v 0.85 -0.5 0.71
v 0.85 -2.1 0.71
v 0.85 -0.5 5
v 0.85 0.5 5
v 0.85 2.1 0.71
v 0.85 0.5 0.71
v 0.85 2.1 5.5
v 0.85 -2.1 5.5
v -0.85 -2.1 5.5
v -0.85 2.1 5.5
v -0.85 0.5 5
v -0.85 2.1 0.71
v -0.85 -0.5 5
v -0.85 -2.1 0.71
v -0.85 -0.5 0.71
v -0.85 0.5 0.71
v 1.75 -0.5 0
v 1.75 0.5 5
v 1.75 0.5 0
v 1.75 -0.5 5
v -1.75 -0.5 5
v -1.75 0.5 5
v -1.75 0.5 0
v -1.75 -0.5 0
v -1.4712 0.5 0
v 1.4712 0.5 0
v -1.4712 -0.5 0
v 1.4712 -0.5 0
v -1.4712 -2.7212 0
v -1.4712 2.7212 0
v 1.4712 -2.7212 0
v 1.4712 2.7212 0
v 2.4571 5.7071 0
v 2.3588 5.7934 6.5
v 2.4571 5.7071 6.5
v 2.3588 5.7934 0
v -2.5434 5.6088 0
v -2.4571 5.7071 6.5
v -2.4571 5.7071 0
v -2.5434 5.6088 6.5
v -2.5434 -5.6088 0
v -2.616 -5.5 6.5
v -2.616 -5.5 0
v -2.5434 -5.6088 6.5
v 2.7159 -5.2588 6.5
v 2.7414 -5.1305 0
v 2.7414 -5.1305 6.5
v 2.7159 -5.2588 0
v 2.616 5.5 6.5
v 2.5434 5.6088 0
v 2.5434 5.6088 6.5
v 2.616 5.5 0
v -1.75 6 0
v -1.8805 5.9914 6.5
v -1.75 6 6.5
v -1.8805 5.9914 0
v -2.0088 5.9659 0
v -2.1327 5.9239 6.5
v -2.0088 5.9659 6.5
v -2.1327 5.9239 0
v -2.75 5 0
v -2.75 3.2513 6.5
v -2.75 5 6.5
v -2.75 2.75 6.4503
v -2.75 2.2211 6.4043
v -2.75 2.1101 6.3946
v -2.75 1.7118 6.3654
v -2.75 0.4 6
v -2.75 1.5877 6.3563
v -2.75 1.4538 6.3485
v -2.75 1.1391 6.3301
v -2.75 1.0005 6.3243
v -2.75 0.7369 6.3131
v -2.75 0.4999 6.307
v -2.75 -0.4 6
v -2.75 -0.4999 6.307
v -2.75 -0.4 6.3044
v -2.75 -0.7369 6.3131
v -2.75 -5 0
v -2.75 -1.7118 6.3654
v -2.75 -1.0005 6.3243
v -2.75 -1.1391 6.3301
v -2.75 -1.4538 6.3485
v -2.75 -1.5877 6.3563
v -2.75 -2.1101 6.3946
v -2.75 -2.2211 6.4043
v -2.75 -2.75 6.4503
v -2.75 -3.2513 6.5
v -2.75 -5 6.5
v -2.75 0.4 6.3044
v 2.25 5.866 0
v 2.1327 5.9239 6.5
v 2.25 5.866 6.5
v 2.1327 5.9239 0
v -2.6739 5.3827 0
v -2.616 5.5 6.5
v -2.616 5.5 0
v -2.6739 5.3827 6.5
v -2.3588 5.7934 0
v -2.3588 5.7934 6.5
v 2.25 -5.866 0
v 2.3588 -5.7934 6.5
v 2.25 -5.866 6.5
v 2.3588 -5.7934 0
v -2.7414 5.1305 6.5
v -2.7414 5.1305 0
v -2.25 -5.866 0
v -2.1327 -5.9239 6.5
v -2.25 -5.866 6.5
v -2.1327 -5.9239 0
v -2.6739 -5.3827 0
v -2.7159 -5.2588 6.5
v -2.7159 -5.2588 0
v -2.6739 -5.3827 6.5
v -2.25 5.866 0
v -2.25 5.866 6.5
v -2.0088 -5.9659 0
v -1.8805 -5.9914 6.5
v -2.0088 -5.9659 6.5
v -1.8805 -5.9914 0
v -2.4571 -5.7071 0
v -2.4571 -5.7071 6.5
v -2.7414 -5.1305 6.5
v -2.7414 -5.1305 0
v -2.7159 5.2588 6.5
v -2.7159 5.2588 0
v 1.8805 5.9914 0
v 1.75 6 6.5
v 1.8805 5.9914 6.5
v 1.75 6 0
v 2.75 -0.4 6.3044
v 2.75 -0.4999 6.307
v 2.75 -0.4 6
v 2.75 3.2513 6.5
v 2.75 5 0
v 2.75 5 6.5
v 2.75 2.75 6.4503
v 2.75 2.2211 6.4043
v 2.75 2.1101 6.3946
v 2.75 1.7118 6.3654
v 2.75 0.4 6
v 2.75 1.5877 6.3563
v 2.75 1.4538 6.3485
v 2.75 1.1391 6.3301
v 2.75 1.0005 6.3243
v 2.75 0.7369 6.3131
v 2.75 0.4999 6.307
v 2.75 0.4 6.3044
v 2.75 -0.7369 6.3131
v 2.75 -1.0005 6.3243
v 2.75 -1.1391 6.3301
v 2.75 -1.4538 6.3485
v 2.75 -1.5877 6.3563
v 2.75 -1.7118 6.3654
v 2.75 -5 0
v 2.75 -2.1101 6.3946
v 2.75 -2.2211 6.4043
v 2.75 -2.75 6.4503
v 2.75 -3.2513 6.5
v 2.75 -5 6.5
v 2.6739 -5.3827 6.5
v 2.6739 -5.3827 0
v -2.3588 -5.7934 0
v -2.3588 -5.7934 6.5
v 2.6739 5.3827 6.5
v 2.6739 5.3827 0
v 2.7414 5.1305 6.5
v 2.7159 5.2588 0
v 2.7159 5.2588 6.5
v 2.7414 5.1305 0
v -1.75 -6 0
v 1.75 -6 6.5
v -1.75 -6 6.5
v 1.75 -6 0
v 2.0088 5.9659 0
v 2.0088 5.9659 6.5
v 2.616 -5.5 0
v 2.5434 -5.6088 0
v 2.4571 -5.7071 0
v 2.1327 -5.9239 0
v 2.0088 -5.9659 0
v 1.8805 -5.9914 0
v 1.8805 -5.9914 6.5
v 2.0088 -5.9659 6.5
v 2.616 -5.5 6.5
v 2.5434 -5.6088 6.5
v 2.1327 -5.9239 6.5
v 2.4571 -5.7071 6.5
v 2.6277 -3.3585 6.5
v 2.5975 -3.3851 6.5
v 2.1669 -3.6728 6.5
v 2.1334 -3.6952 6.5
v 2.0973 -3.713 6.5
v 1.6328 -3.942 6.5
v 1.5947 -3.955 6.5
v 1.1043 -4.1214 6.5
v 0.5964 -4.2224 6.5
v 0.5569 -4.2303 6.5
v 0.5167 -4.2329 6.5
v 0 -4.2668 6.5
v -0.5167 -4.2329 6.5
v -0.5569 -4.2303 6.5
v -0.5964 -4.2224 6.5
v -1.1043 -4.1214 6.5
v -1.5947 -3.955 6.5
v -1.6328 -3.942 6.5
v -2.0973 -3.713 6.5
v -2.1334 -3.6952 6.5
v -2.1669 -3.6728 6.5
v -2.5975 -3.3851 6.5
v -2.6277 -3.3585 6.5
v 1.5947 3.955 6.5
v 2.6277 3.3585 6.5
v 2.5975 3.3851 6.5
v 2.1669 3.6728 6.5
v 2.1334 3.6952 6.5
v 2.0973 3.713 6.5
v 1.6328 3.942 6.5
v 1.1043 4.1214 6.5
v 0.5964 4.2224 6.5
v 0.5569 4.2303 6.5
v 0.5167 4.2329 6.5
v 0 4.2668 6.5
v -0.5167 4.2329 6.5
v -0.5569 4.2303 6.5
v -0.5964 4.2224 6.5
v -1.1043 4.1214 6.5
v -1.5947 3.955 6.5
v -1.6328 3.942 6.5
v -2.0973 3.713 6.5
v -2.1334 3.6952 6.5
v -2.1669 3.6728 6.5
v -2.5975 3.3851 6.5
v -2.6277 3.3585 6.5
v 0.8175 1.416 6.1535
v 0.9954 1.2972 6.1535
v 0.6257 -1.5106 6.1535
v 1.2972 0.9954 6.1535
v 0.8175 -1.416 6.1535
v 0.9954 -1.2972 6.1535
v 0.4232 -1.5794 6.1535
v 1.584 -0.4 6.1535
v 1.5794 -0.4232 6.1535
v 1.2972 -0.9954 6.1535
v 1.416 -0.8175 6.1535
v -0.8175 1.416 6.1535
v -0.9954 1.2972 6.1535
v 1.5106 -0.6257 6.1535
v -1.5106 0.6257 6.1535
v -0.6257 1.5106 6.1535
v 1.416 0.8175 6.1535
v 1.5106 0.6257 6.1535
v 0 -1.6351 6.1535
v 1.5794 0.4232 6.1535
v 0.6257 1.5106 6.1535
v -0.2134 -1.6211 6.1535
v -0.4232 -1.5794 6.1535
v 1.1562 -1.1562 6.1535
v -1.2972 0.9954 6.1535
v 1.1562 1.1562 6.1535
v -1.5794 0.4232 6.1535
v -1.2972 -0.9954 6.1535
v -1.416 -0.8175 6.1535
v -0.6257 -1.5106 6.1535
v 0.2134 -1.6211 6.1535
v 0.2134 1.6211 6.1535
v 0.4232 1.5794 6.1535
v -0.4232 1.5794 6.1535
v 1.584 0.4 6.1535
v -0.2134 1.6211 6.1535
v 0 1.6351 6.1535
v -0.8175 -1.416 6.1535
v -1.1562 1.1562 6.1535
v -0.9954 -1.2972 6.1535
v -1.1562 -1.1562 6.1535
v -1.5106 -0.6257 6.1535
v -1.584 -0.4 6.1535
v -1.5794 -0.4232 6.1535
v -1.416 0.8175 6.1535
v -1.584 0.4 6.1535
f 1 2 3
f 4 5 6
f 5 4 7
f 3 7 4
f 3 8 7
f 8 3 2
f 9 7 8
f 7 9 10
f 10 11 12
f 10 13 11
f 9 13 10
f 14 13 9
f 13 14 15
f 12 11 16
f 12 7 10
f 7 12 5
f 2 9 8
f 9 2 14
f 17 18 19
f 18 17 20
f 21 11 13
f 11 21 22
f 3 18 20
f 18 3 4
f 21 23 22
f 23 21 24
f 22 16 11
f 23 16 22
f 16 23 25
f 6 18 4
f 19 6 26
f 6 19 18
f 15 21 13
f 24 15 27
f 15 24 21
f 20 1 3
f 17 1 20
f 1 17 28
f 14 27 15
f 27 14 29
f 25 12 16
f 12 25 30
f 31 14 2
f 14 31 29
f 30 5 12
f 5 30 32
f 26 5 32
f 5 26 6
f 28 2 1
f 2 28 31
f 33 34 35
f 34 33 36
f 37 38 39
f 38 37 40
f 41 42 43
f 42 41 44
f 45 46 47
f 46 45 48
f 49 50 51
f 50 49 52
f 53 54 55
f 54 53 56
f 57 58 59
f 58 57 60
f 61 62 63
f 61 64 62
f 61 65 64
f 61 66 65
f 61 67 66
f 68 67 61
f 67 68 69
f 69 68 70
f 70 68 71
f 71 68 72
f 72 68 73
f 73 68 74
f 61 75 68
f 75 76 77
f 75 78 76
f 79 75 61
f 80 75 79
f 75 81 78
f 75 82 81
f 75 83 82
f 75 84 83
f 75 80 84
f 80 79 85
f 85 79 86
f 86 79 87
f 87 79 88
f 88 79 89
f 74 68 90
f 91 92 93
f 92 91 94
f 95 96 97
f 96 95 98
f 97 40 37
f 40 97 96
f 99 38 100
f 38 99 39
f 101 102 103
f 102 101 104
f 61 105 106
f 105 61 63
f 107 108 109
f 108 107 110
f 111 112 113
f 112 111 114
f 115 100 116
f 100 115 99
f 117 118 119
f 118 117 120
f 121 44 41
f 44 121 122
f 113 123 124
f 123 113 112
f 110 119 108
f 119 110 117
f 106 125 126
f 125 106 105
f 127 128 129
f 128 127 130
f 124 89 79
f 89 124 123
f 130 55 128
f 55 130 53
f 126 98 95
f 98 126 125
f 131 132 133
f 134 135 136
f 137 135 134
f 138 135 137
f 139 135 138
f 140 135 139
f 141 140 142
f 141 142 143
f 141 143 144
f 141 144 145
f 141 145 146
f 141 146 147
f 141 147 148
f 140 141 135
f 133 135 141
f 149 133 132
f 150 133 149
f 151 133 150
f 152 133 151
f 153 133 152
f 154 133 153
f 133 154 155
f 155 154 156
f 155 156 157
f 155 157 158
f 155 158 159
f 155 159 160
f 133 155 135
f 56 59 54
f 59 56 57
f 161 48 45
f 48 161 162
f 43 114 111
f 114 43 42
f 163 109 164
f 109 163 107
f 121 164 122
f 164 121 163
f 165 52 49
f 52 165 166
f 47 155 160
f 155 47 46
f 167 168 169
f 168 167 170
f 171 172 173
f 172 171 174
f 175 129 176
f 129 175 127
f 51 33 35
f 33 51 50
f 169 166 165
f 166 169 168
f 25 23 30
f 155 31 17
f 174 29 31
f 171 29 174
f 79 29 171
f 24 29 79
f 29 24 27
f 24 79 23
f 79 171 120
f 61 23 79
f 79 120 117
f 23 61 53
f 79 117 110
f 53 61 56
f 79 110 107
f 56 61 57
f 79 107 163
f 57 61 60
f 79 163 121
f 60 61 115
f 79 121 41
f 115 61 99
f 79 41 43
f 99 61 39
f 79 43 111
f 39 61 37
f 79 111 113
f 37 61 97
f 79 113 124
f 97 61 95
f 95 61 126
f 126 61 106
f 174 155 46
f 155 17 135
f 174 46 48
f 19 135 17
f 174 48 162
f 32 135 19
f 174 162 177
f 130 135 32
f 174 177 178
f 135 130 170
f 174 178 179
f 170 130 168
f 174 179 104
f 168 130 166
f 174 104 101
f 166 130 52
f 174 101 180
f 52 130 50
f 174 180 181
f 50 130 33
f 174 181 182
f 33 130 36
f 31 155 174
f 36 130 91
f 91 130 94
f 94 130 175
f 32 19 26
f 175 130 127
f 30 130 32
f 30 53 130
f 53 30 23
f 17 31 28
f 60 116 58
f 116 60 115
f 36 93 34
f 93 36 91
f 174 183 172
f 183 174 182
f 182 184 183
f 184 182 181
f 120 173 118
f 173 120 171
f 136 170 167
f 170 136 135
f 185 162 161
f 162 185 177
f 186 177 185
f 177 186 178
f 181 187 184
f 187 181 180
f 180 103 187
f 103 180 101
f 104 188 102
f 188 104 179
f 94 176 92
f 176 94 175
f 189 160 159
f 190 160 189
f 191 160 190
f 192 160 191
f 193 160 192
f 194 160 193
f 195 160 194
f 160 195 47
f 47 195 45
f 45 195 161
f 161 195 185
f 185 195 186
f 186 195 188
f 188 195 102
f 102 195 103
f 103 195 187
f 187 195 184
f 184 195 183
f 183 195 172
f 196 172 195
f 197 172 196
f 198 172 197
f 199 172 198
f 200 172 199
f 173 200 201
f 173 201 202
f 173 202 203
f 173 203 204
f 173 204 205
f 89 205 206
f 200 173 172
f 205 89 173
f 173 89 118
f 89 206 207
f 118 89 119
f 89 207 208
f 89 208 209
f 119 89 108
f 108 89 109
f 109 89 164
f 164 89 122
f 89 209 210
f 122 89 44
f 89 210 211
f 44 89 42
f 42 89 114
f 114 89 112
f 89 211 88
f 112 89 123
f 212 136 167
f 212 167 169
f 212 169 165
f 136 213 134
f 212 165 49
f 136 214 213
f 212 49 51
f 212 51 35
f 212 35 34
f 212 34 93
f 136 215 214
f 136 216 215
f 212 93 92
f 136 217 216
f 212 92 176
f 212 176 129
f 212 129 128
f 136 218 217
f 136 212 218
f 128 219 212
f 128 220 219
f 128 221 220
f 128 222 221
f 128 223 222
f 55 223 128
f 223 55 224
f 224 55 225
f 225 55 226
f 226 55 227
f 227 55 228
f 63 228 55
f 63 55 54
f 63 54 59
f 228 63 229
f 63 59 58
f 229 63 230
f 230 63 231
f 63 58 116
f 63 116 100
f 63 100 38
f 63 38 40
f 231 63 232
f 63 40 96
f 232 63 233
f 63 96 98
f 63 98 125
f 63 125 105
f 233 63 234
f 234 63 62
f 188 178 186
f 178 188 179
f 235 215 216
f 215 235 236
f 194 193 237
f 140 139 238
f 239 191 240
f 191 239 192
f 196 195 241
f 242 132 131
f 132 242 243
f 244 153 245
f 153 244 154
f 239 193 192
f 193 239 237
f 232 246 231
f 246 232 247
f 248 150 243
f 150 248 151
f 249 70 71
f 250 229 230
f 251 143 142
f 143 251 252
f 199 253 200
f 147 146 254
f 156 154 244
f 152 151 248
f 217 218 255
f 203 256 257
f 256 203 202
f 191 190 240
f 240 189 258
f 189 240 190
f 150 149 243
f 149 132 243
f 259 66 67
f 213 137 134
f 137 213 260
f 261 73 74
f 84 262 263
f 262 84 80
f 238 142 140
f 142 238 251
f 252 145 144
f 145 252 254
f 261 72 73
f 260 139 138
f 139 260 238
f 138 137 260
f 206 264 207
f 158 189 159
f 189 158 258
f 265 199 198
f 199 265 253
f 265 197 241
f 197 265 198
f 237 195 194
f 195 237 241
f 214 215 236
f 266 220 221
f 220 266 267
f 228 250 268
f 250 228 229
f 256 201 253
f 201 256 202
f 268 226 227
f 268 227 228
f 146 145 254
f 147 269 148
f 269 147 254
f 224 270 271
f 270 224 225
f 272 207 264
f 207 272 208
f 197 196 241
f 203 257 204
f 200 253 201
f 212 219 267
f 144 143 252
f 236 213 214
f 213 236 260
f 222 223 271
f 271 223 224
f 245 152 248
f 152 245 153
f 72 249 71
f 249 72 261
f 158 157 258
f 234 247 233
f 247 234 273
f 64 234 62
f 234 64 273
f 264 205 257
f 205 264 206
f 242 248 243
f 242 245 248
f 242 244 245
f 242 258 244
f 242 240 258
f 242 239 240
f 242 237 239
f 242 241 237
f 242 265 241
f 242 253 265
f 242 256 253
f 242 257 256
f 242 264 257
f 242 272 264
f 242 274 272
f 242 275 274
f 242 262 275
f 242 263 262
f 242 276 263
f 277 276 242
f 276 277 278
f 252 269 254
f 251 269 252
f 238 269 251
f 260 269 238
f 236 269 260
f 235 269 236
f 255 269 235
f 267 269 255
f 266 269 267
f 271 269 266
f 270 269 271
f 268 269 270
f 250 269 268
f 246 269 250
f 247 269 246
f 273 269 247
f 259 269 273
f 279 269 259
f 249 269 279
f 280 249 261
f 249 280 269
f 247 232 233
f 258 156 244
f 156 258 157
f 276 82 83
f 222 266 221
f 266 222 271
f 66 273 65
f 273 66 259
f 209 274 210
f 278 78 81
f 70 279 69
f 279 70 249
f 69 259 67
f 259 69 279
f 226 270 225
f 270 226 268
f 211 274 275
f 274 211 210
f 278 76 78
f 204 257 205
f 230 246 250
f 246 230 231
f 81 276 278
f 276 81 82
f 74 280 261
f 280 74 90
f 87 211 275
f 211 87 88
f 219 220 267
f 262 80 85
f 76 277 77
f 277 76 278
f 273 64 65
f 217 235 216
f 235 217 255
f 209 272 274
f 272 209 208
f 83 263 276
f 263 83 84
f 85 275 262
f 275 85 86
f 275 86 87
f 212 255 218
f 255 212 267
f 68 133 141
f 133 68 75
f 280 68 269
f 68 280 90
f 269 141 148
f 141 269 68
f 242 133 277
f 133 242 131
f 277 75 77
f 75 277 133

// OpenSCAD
// ============================================================
//  COPRI-FADER PARAMETRICO — KORG SP-200
//  Misure reali prese con calibro dal pezzo originale.
//  Apri con OpenSCAD → F5 anteprima → F6 render → Export STL
// ============================================================

/* ===================== MISURE DA CALIBRO ===================== */

// --- STELO DEL FADER (lamina metallica che sporge dallo slider) ---
stem_thickness    = 1.5;   // spessore della lamina metallica (mm)
stem_width        = 4.0;   // larghezza della lamina metallica (mm)
stem_insert_depth = 5.5;   // profondità di innesto nel tappo (mm)
clearance         = 0.2;   // tolleranza stampa 3D per incastro (mm)

// --- FORMA ESTERNA DEL TAPPO ---
cap_length    = 12.0;  // lunghezza (mm) — direzione di scorrimento del fader
cap_width     = 5.5;   // larghezza (mm) — trasversale allo scorrimento
cap_height    = 6.5;   // altezza totale (mm)
corner_radius = 1.0;   // raggio angoli arrotondati (mm)

// --- INTERNO A CROCE (crea le alette a molla) ---
slit_width = 1.0;      // larghezza dell'intaglio trasversale (mm)
slit_depth = 5.0;      // profondità dell'intaglio dal basso (mm) — più profondo = più elastico
wall_min   = 1.0;      // parete minima tra intaglio e bordo esterno (mm)

// --- SMUSSO ANTI-ZAMPA D'ELEFANTE ---
chamfer = 0.7;         // invito svasato all'imboccatura inferiore (mm)

// --- ERGONOMIA SUPERIORE ---
finger_concavity = 0.4;    // profondità incavo concavo per il dito (mm)
finger_radius    = 25;     // raggio sfera per l'incavo (mm) — più grande = più dolce
indicator_width  = 0.8;    // larghezza tacca indicatrice (mm)
indicator_depth  = 0.5;    // profondità tacca indicatrice (mm)

/* ================================================================
   GEOMETRIA — non serve modificare da qui in giù
   ================================================================ */

$fn = 48;

// Dimensioni calcolate della cavità
sw = stem_thickness + clearance;   // apertura cavità in X (spessore + gioco)
sl = stem_width + clearance;       // apertura cavità in Y (larghezza + gioco)
slit_len = cap_width - 2*wall_min; // lunghezza dell'intaglio trasversale

// Corpo esterno: rettangolo arrotondato centrato in XY, da z=0 a z=h
module rounded_box(w, l, h, r) {
    hull() {
        for (x = [-w/2 + r, w/2 - r])
            for (y = [-l/2 + r, l/2 - r])
                translate([x, y, 0])
                    cylinder(h = h, r = r);
    }
}

// Cavità interna a croce + smusso
module cross_cavity() {
    // ---- Fessura orizzontale (alloggiamento lamina, lungo cap_length/Y) ----
    translate([-sw/2, -sl/2, -0.1])
        cube([sw, sl, stem_insert_depth + 0.1]);

    // ---- Intaglio verticale passante (crea le due alette a molla) ----
    // Corre lungo X (trasversale alla lamina), dividendo il materiale in due dita
    // elastiche che stringono la lamina per attrito.
    translate([-slit_len/2, -slit_width/2, -0.1])
        cube([slit_len, slit_width, slit_depth + 0.1]);

    // ---- Smusso/invito svasato all'imboccatura (anti elephant's foot) ----
    // Piramide tronca: larga in basso (z=0), si restringe alla misura della cavità
    hull() {
        translate([-(sw/2 + chamfer), -(sl/2 + chamfer), -0.1])
            cube([sw + 2*chamfer, sl + 2*chamfer, 0.01]);
        translate([-sw/2, -sl/2, chamfer])
            cube([sw, sl, 0.01]);
    }
}

module fader_cap() {
    difference() {
        // Corpo esterno arrotondato
        rounded_box(cap_width, cap_length, cap_height, corner_radius);

        // Cavità interna a croce con smusso
        cross_cavity();

        // Incavo concavo per il dito (sfera tangente alla sommità)
        translate([0, 0, cap_height + finger_radius - finger_concavity])
            sphere(r = finger_radius);

        // Tacca indicatrice (fessura trasversale sulla faccia superiore)
        translate([-(cap_width/2 + 0.5), -indicator_width/2, cap_height - indicator_depth])
            cube([cap_width + 1, indicator_width, indicator_depth + 0.1]);
    }
}

fader_cap();
